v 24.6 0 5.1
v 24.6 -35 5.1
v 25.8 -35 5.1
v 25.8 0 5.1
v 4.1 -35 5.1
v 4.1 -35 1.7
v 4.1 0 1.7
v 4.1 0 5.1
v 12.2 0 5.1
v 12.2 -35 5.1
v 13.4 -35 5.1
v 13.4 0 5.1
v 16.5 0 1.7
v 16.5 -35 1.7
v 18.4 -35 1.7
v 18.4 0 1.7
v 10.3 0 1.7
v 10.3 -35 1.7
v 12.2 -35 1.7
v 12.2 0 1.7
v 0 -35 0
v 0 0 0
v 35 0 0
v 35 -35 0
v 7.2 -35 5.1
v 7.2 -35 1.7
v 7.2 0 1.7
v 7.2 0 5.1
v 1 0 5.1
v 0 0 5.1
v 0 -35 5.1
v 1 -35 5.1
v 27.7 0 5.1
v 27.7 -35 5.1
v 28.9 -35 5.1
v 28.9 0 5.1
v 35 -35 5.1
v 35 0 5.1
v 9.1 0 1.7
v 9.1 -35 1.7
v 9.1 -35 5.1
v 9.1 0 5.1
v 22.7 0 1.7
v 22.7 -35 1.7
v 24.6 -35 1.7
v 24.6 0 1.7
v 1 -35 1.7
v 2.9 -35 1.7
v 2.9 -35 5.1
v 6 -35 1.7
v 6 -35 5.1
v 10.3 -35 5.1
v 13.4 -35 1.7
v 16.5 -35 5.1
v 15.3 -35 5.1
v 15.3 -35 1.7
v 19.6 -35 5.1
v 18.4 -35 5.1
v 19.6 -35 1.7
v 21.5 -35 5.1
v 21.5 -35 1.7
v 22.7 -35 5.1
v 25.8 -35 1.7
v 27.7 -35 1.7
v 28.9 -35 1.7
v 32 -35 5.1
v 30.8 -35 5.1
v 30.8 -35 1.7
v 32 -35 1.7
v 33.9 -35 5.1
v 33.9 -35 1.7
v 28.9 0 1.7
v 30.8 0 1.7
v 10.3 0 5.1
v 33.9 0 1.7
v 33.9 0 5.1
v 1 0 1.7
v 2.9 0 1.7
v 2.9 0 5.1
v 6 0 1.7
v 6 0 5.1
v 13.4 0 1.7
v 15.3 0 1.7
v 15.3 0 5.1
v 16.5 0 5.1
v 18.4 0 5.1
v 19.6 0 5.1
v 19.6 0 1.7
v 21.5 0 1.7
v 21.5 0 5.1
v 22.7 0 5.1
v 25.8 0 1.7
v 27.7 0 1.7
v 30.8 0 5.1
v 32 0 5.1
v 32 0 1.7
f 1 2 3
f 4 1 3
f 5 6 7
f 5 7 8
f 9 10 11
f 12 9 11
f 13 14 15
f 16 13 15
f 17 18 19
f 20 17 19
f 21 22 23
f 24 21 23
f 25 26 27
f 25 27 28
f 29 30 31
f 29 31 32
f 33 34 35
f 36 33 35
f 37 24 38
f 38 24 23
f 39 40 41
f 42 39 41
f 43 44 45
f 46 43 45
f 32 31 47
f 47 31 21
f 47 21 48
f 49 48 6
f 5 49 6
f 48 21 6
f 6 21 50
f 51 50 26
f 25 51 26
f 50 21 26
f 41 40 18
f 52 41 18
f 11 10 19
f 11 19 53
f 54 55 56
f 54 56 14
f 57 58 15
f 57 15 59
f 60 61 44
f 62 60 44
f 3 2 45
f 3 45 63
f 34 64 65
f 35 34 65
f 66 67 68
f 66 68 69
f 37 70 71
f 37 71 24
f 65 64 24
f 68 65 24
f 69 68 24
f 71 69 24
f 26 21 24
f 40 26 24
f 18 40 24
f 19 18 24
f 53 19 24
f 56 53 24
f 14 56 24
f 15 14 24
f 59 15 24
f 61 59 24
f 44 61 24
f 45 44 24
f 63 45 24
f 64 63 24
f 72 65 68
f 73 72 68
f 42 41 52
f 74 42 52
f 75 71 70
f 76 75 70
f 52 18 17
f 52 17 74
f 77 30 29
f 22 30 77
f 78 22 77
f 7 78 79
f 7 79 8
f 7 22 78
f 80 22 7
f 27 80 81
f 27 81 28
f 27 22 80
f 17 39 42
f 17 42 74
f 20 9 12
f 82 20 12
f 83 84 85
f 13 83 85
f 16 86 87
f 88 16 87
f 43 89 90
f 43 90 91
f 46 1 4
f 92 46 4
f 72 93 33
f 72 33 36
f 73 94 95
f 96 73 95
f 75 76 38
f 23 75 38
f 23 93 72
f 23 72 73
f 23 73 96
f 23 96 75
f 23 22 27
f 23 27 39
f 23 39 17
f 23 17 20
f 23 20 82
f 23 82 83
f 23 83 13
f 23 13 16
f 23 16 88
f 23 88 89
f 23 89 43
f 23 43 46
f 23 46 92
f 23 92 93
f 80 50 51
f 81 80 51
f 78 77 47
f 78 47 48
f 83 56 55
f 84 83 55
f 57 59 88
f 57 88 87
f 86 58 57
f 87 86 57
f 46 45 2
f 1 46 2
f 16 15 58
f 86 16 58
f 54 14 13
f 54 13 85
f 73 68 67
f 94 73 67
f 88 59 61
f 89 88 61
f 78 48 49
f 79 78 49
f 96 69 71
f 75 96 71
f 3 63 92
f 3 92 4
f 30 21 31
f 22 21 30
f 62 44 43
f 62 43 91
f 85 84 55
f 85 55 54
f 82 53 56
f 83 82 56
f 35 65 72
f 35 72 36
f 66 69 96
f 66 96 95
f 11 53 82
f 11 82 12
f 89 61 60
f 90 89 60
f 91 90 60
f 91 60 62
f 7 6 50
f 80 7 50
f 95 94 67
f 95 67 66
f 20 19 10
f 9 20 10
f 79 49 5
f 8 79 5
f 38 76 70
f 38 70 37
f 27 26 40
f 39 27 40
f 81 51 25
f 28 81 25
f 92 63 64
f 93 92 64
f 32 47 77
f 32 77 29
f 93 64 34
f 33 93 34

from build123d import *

# Parameters (mm, degrees)
SKETCH_1_W          = 35
SKETCH_1_H          = 35
EXTRUDE_1_DEPTH     = 5.1
SKETCH_2_W          = 1.9
SKETCH_2_H          = 3.4
CUT_EXTRUDE_1_DEPTH = 50.759521702


with BuildPart() as part:
    # 草图1 → 凸台-拉伸1 (new body)
    with BuildSketch(Plane.XY):
        with Locations((17.5, -17.5)):
            Rectangle(SKETCH_1_W, SKETCH_1_H)
    extrude(amount=EXTRUDE_1_DEPTH)

    # 草图2 → 切除-拉伸1 (cut, through all)
    with BuildSketch(Plane.XZ.offset(35)):
        with Locations((1.95, 3.4)):
            Rectangle(SKETCH_2_W, SKETCH_2_H)
        with Locations((5.05, 3.4)):
            Rectangle(SKETCH_2_W, SKETCH_2_H)
        with Locations((8.15, 3.4)):
            Rectangle(SKETCH_2_W, SKETCH_2_H)
        with Locations((11.25, 3.4)):
            Rectangle(SKETCH_2_W, SKETCH_2_H)
        with Locations((14.35, 3.4)):
            Rectangle(SKETCH_2_W, SKETCH_2_H)
        with Locations((17.45, 3.4)):
            Rectangle(SKETCH_2_W, SKETCH_2_H)
        with Locations((20.55, 3.4)):
            Rectangle(SKETCH_2_W, SKETCH_2_H)
        with Locations((23.65, 3.4)):
            Rectangle(SKETCH_2_W, SKETCH_2_H)
        with Locations((26.75, 3.4)):
            Rectangle(SKETCH_2_W, SKETCH_2_H)
        with Locations((29.85, 3.4)):
            Rectangle(SKETCH_2_W, SKETCH_2_H)
        with Locations((32.95, 3.4)):
            Rectangle(SKETCH_2_W, SKETCH_2_H)
    extrude(amount=-CUT_EXTRUDE_1_DEPTH, mode=Mode.SUBTRACT)


solid = part.part
